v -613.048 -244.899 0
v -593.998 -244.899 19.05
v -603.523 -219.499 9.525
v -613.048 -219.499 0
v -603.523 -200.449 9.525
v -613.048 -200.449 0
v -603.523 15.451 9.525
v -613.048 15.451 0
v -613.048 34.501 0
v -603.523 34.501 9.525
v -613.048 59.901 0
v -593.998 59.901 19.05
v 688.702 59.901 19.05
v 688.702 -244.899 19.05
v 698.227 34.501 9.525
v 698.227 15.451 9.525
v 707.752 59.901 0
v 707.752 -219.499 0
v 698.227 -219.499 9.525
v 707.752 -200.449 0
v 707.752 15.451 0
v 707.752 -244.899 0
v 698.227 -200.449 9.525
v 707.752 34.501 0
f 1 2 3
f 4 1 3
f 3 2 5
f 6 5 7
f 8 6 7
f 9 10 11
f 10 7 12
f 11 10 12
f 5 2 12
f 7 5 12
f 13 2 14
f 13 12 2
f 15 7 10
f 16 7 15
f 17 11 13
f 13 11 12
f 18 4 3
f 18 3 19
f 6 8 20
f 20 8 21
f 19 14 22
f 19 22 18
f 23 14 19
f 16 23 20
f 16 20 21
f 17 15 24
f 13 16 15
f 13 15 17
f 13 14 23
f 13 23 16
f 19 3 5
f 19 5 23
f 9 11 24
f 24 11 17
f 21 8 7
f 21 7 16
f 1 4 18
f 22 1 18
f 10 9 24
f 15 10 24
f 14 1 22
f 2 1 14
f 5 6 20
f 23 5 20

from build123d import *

# Parameters (mm, degrees)
F0_W     = 1320.8
F0_H     = 304.8
F1_DEPTH = 19.05
F2_SIZE  = 19.04999
F3_W     = 1320.8
F3_H     = 19.05
F4_DEPTH = 9.525


# Not quite as in the source:
# - a fillet or chamfer is up to 0.001 mm smaller than in the source, because OpenCascade refuses the exact size


with BuildPart() as f1:
    # F0 (on Top) → F1 (new body)
    with BuildSketch(Plane.XY):
        with Locations((47.3523183346, -92.4993205261)):
            Rectangle(F0_W, F0_H)
    extrude(amount=F1_DEPTH)

    # F2 (size 19.05 in the source; OpenCascade refuses exactly that, so slightly less here)
    f2_edges = [f1.edges().sort_by_distance(p)[0] for p in [
        (707.752318, -92.499321, 19.05),
        (-613.047682, -92.499321, 19.05),
    ]]
    chamfer(f2_edges, length=F2_SIZE)

    # F3 (on face) → F4 (cut)
    with BuildSketch(Plane(origin=(0, 0, 0), x_dir=(1, 0, 0), z_dir=(0, 0, -1))):
        with Locations((47.3523183346, 209.9743205261)):
            Rectangle(F3_W, F3_H)
        with Locations((47.3523183346, -24.9756794739)):
            Rectangle(F3_W, F3_H)
    extrude(amount=-F4_DEPTH, mode=Mode.SUBTRACT)


solid = f1.part
